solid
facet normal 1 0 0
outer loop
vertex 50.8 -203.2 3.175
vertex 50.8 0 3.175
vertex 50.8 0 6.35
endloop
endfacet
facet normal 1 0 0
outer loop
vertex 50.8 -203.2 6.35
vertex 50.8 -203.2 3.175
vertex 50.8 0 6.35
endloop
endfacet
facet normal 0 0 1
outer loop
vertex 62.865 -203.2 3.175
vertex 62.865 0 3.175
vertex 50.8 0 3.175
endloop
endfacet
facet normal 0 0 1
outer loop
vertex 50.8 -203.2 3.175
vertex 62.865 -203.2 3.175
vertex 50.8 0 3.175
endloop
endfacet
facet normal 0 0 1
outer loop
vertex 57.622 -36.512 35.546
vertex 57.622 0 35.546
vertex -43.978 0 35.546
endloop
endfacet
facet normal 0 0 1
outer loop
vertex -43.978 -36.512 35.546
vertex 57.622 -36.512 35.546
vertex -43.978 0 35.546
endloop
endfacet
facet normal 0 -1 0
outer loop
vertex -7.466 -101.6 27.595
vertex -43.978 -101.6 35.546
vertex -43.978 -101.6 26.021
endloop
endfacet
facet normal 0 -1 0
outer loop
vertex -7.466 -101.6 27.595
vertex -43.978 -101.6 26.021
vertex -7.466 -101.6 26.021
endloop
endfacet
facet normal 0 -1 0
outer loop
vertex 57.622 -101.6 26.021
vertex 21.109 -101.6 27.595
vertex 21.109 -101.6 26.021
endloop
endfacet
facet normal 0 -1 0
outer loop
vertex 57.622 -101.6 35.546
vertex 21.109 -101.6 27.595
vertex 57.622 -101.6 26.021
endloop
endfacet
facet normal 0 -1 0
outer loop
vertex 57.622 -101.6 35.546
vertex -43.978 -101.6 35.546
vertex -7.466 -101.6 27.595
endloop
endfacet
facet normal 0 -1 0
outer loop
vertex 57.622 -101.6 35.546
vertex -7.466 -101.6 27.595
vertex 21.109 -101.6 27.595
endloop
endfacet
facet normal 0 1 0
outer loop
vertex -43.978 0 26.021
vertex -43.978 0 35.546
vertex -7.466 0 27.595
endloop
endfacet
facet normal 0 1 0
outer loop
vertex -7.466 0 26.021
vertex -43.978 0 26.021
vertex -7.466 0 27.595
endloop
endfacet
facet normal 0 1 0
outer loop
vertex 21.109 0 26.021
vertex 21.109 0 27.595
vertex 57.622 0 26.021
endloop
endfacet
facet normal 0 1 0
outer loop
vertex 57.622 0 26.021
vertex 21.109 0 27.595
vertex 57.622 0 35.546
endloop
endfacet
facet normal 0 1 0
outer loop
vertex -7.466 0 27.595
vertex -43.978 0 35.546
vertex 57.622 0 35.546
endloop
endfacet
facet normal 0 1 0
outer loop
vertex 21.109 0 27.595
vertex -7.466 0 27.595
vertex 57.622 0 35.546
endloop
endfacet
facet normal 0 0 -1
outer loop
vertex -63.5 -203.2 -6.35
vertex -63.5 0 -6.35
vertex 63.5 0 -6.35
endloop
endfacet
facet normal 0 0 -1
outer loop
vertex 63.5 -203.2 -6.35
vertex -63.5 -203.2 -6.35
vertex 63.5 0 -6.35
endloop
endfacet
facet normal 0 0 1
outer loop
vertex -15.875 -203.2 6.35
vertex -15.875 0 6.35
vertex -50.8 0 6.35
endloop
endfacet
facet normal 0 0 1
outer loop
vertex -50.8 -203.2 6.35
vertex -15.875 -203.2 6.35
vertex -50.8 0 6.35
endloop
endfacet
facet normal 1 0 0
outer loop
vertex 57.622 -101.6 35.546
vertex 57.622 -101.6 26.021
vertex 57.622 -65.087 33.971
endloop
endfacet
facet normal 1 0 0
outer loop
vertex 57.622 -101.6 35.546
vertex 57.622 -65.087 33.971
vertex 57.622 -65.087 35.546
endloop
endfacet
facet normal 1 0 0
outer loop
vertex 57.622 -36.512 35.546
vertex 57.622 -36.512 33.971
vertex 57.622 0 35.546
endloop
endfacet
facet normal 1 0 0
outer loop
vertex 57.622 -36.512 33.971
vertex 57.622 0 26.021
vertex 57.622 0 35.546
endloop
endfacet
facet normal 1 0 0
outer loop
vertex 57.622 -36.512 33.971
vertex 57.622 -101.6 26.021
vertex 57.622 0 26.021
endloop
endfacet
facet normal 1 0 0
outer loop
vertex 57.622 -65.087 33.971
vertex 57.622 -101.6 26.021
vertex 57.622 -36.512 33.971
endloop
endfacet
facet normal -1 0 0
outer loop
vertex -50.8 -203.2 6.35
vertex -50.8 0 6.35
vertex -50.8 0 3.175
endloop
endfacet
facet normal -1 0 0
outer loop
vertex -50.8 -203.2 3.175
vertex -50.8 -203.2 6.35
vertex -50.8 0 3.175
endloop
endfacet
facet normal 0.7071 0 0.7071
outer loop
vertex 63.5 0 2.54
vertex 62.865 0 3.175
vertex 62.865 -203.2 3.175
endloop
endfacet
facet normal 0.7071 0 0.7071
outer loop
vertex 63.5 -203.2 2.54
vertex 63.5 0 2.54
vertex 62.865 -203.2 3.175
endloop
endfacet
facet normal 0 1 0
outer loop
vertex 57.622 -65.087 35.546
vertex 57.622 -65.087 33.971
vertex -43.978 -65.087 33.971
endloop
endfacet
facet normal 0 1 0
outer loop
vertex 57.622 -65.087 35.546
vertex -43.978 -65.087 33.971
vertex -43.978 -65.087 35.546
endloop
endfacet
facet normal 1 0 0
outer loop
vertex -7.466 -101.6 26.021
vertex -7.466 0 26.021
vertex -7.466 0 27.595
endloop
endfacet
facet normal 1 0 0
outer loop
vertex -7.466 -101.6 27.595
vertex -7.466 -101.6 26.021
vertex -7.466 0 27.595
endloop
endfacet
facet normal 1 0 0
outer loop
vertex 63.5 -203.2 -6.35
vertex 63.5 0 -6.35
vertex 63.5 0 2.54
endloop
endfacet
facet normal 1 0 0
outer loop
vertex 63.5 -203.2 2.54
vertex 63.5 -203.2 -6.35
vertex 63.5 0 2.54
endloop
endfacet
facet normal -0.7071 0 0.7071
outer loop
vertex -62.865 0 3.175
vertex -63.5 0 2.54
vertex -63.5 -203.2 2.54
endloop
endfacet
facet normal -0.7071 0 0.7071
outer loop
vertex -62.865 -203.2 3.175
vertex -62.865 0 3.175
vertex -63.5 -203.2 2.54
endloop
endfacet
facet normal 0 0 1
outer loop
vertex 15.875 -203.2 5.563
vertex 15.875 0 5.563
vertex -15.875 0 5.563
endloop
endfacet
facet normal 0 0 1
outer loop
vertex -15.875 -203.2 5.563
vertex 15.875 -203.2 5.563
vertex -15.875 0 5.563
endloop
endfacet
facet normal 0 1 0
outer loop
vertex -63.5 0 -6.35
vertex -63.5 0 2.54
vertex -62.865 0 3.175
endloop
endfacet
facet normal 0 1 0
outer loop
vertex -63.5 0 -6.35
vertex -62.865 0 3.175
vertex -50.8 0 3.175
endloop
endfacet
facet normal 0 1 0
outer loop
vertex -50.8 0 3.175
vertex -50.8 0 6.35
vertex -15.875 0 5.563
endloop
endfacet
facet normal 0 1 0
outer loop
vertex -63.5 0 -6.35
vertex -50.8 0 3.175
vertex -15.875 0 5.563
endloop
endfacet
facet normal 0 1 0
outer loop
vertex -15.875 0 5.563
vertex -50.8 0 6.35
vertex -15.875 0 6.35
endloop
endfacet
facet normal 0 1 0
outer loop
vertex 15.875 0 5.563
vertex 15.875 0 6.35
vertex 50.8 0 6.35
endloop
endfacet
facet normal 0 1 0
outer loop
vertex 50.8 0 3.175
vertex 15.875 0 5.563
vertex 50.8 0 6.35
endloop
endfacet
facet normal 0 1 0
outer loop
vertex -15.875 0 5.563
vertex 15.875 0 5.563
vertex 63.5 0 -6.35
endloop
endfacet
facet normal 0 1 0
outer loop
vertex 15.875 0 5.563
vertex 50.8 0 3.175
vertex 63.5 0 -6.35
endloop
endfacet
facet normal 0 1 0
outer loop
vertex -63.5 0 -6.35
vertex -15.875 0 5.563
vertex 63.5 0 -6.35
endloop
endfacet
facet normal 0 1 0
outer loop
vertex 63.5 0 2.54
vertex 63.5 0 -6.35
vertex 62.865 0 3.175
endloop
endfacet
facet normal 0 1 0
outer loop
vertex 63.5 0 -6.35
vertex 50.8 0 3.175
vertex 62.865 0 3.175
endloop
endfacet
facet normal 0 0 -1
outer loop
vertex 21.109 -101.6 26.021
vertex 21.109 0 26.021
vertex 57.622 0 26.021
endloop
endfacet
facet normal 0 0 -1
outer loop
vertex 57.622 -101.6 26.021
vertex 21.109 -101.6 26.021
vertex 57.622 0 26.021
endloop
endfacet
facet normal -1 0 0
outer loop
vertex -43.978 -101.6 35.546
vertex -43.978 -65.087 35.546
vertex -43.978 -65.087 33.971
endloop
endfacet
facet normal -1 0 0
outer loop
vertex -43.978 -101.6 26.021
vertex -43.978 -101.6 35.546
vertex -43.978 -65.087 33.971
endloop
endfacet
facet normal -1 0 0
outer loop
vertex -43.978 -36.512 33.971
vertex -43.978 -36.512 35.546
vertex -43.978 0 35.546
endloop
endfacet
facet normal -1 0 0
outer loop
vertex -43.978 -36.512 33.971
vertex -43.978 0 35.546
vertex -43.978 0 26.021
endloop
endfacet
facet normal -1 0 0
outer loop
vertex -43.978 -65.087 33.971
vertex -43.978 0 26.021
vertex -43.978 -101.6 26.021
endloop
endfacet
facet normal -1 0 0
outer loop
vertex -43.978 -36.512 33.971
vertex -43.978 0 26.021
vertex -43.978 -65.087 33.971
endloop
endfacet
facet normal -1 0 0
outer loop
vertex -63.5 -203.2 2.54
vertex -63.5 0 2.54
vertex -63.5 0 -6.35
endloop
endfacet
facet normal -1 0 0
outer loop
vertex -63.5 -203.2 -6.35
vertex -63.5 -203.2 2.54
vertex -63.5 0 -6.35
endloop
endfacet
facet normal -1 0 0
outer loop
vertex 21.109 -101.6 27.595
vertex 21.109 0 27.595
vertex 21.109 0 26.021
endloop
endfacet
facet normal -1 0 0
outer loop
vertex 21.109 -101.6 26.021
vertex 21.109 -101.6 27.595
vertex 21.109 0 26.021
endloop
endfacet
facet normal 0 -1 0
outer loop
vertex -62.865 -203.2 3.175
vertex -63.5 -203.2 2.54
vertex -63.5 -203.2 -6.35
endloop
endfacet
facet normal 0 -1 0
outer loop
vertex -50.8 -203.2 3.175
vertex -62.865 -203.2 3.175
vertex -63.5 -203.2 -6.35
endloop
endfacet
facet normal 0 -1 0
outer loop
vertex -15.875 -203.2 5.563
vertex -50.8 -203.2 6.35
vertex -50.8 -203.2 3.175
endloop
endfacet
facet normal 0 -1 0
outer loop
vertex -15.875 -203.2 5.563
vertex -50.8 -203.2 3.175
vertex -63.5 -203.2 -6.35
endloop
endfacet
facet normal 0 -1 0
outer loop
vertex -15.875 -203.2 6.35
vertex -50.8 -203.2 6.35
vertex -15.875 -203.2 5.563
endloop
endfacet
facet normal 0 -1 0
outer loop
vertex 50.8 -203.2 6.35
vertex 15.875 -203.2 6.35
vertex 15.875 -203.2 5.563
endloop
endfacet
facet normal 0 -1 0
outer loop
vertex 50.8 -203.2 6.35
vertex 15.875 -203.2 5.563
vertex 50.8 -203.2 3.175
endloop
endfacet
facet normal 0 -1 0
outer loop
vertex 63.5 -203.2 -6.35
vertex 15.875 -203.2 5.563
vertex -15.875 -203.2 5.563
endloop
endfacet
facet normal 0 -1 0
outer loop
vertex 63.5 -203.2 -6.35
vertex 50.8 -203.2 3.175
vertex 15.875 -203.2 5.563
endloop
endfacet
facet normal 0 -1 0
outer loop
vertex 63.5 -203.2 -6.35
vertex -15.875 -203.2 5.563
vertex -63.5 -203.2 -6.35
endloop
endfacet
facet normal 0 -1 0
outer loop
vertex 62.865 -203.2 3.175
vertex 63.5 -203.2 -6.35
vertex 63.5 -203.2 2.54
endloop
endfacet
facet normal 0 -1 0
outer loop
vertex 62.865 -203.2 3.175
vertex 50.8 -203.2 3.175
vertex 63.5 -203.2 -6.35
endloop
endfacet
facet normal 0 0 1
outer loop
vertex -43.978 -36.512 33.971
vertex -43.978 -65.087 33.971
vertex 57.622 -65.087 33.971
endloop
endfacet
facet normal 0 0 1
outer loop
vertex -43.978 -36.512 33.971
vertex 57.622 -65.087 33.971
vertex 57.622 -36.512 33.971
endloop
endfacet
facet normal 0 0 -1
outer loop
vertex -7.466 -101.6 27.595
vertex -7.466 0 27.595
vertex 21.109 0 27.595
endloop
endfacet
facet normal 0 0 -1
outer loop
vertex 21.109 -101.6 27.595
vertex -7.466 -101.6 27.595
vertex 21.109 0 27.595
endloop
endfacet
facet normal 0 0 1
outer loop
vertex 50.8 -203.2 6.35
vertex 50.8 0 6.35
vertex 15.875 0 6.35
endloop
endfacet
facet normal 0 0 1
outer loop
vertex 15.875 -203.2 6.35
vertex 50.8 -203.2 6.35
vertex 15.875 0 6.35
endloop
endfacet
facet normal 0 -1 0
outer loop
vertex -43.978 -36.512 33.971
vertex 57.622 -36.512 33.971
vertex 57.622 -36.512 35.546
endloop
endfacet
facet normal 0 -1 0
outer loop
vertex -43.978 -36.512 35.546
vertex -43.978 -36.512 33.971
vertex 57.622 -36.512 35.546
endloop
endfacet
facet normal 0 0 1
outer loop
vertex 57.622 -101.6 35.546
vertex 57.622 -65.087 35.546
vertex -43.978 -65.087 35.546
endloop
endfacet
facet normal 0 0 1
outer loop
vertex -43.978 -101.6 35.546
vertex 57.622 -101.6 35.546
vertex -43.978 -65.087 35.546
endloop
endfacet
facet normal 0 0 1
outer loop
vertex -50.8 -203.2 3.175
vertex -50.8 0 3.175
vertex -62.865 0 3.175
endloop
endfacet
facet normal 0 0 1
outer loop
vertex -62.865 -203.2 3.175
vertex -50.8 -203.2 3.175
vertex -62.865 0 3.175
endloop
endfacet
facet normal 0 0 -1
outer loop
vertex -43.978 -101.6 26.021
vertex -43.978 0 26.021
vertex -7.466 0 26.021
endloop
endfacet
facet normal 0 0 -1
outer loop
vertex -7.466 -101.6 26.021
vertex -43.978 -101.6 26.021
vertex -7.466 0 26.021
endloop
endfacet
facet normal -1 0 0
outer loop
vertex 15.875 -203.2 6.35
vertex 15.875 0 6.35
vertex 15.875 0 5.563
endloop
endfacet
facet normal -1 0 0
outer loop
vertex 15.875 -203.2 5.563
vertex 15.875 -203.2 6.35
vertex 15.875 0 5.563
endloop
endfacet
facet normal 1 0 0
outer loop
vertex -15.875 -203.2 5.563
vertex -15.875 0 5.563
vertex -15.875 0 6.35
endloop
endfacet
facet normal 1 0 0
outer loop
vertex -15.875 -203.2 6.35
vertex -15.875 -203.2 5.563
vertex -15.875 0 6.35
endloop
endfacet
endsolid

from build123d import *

# Parameters (mm, degrees)
F1_DEPTH = 203.2
F3_DEPTH = 101.6
F4_W     = 28.575
F4_H     = 1.5748
F5_DEPTH = 121.122969
F6_SIZE  = 0.635


with BuildPart() as f1:
    # F0 (on Front) → F1 (new body)
    with BuildSketch(Plane.XZ):
        Polygon((-63.5, -6.35), (63.5, -6.35), (63.5, 3.175), (50.8, 3.175), (50.8, 6.35), (15.875, 6.35), (15.875, 5.5626), (-15.875, 5.5626), (-15.875, 6.35), (-50.8, 6.35), (-50.8, 3.175), (-63.5, 3.175), align=None)
    extrude(amount=F1_DEPTH)

    # F6
    f6_edges = [f1.edges().sort_by_distance(p)[0] for p in [
        (-63.5, -101.6, 3.175),
        (63.5, -101.6, 3.175),
    ]]
    chamfer(f6_edges, length=F6_SIZE)


with BuildPart() as f3:
    # F2 (on Front) → F3 (new body)
    with BuildSketch(Plane.XZ):
        Polygon((57.621969, 35.545684), (-43.978031, 35.545684), (-43.978031, 26.020684), (-7.465531, 26.020684), (-7.465531, 27.595484), (21.109469, 27.595484), (21.109469, 26.020684), (57.621969, 26.020684), align=None)
    extrude(amount=F3_DEPTH)

    # F4 (on face) → F5 (cut, through all)
    with BuildSketch(Plane.YZ.offset(57.621969)):
        with Locations((-50.8, 34.758284)):
            Rectangle(F4_W, F4_H)
    extrude(amount=-F5_DEPTH, mode=Mode.SUBTRACT)


solid = Compound([f1.part, f3.part])
